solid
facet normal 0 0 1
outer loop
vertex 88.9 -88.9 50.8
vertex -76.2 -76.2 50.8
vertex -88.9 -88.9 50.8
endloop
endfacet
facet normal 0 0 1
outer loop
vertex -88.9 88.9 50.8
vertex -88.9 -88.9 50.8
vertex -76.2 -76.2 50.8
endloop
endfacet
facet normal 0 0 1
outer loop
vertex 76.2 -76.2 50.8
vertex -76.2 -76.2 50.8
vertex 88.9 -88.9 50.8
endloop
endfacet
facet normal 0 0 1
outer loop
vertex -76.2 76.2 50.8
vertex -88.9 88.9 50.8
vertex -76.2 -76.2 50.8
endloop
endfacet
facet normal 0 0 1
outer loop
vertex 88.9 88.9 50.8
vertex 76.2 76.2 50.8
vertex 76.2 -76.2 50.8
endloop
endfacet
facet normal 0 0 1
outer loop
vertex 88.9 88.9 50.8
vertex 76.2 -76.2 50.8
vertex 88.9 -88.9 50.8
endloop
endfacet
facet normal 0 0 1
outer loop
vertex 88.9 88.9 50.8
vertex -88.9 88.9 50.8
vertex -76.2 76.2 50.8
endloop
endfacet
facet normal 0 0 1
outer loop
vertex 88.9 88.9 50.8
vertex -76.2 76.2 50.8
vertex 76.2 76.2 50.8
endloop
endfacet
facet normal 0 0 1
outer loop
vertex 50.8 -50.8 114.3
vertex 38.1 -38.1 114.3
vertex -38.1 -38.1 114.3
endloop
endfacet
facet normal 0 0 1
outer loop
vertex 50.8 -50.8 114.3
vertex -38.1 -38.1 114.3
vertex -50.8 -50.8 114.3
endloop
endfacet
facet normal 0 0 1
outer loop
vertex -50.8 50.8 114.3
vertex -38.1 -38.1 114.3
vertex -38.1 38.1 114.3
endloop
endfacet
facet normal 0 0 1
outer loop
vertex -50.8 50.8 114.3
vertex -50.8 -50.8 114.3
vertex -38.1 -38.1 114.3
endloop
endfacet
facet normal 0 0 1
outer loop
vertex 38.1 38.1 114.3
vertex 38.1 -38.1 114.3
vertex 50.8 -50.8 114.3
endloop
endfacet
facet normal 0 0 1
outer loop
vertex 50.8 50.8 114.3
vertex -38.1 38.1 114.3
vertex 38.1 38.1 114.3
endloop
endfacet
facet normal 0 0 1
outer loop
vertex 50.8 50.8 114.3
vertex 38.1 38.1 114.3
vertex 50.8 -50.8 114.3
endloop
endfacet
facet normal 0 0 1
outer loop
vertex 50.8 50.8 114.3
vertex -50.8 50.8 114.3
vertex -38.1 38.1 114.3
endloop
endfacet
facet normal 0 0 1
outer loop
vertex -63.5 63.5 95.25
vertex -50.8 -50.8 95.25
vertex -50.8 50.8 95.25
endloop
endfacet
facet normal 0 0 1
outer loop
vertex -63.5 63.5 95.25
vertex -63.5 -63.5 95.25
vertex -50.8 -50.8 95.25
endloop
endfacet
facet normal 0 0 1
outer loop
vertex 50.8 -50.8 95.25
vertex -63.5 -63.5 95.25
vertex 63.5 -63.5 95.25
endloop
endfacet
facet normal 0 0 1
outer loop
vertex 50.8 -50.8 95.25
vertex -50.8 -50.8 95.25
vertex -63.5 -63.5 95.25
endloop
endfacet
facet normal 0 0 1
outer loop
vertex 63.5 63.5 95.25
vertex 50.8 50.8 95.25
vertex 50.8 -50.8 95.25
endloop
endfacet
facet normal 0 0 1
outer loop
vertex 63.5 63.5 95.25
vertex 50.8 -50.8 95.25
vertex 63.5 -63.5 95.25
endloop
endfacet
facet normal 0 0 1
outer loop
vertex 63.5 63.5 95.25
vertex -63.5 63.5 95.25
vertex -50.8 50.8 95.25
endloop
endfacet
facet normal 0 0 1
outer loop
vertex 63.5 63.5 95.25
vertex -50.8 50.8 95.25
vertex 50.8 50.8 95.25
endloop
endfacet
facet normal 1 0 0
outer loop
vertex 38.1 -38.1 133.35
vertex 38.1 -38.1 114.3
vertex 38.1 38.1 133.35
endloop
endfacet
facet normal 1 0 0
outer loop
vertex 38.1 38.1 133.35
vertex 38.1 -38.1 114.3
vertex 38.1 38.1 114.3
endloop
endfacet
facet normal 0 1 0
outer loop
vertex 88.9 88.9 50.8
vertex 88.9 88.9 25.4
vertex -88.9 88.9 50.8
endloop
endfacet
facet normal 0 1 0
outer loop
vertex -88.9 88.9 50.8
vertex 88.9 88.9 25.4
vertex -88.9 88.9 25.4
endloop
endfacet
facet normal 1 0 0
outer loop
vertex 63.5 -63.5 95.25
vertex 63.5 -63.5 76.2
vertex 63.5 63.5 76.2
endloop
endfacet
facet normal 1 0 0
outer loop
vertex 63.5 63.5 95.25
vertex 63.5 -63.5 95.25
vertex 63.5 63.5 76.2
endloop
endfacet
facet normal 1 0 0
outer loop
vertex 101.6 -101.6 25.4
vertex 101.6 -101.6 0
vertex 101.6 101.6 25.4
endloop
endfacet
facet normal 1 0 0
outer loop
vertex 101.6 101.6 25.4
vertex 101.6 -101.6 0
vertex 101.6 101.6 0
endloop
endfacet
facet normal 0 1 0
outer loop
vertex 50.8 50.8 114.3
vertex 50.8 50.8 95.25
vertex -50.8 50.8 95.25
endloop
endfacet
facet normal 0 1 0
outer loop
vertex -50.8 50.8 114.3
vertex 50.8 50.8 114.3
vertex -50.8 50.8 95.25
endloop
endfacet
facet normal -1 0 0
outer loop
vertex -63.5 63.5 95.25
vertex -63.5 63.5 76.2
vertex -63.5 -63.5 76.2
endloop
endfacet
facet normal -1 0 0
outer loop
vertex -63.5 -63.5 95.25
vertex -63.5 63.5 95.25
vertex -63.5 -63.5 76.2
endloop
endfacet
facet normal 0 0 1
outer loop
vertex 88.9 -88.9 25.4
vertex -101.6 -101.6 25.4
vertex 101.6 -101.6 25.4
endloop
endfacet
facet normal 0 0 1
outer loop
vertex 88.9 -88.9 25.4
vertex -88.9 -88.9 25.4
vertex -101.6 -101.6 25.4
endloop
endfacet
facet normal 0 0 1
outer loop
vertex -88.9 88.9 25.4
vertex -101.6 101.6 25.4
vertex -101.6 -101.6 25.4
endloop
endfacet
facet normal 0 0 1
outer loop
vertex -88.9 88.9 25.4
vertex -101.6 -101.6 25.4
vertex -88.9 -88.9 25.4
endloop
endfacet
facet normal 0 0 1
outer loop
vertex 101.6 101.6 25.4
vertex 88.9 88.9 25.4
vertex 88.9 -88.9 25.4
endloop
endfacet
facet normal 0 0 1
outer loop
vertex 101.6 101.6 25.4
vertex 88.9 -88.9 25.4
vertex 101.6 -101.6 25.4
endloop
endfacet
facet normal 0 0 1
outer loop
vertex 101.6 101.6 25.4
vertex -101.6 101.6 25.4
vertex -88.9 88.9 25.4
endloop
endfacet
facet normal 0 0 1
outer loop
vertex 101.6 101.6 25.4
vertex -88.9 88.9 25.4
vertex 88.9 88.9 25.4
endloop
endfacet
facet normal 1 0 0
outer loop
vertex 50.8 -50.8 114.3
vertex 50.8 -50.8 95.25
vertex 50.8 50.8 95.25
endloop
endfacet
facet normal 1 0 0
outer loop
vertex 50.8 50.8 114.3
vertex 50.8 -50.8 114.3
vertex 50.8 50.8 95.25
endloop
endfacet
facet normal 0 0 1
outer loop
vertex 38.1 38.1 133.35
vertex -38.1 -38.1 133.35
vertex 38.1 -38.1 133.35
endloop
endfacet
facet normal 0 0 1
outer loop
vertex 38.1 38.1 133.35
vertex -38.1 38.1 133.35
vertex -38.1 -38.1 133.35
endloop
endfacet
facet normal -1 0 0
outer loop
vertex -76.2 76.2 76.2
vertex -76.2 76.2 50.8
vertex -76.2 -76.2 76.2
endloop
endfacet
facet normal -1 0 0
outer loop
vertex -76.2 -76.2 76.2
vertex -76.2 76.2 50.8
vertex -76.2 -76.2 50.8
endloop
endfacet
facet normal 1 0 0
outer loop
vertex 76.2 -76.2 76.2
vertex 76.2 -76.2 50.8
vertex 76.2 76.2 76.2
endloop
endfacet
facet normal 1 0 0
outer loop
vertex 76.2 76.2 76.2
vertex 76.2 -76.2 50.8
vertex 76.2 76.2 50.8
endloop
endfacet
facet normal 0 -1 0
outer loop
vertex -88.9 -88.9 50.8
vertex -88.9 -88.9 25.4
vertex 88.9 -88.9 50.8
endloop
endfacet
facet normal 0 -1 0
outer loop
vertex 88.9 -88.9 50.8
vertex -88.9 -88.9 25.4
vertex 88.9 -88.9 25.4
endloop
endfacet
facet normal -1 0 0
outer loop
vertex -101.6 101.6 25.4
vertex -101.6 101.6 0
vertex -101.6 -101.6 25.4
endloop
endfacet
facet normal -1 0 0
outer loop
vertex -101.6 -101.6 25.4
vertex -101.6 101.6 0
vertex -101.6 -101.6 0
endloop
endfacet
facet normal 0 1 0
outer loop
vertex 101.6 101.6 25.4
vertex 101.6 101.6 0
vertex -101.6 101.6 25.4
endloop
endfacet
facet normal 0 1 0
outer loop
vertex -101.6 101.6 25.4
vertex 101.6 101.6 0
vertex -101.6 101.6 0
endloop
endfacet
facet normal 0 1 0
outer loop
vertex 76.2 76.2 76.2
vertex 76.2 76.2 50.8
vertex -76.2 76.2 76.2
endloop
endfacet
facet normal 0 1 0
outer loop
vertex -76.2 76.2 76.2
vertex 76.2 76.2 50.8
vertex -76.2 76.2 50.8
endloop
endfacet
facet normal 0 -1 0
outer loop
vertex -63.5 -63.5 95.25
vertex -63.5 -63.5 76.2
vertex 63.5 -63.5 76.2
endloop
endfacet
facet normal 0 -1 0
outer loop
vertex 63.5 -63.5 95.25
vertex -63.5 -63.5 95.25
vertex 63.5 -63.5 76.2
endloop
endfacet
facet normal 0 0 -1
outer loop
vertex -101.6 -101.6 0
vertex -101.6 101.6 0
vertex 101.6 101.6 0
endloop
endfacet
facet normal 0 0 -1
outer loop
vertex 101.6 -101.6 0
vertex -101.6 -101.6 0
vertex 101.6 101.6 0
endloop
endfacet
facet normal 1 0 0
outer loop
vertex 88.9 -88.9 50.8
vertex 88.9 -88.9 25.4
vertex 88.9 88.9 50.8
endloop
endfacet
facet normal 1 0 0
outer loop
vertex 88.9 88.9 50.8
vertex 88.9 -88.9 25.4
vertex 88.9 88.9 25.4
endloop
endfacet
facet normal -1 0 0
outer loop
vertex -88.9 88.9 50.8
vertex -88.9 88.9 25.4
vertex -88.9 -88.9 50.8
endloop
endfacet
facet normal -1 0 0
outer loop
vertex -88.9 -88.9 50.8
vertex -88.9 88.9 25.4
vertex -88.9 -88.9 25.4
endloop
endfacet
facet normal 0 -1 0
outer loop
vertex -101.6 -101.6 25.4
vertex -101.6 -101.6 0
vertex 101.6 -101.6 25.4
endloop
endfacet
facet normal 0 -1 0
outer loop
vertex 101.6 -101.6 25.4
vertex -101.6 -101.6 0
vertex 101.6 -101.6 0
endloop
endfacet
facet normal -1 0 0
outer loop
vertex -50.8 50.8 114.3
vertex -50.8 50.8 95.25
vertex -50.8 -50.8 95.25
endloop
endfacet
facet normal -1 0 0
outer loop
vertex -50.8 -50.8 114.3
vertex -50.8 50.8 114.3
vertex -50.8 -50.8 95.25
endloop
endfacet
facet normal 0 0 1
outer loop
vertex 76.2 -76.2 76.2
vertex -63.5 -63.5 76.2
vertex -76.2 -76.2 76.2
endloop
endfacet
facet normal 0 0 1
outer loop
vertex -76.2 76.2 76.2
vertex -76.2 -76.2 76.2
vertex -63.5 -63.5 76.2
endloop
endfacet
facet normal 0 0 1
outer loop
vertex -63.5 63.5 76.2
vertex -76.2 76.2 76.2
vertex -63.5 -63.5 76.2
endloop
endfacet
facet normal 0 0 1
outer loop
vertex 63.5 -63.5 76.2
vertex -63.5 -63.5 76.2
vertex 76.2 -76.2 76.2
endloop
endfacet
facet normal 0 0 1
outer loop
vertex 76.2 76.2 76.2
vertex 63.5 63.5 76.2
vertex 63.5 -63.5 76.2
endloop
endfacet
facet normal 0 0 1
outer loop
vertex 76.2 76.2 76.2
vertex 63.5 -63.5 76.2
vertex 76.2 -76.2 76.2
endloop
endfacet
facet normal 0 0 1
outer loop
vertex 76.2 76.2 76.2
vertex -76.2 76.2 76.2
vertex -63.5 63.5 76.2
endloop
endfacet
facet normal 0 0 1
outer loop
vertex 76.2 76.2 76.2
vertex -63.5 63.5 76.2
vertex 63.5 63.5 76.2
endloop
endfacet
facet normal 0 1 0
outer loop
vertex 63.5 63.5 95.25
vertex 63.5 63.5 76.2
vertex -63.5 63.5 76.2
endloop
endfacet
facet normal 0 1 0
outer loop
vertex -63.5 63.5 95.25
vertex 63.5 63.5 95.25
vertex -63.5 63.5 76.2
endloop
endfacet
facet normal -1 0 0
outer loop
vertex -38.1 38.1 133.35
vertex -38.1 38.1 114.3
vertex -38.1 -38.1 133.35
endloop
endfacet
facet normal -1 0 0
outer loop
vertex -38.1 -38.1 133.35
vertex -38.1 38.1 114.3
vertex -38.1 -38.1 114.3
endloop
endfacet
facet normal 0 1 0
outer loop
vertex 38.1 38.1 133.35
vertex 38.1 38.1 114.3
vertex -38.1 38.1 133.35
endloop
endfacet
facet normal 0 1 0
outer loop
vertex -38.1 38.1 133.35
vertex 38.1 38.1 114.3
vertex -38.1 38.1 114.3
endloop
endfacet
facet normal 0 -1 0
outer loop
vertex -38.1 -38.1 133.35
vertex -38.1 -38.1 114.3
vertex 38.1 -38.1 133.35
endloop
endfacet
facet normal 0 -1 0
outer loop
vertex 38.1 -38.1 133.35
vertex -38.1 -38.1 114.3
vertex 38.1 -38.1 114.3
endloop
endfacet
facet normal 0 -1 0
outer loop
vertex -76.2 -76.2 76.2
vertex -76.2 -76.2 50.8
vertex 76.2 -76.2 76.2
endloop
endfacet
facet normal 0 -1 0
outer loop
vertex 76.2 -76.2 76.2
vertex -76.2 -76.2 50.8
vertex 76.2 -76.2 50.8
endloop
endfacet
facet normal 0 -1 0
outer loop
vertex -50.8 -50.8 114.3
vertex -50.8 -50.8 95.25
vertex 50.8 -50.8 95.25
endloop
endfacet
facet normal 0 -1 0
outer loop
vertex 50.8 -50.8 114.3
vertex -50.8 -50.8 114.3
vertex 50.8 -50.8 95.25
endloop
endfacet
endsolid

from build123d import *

# Parameters (mm, degrees)
F0_W      = 101.6
F0_H      = 101.6
F1_DEPTH  = 25.4
F2_W      = 88.9
F2_H      = 88.9
F3_DEPTH  = 25.4
F4_W      = 76.2
F4_H      = 76.2
F5_DEPTH  = 25.4
F6_W      = 63.5
F6_H      = 63.5
F7_DEPTH  = 19.05
F8_W      = 50.8
F8_H      = 50.8
F9_DEPTH  = 19.05
F10_W     = 38.1
F10_H     = 38.1
F11_DEPTH = 19.05


with BuildPart() as f1:
    # F0 (on Top) → F1 (new body)
    with BuildSketch(Plane.XY):
        with Locations((50.8, 50.8)):
            Rectangle(F0_W, F0_H)
        with Locations((-50.8, 50.8)):
            Rectangle(F0_W, F0_H)
        with Locations((-50.8, -50.8)):
            Rectangle(F0_W, F0_H)
        with Locations((50.8, -50.8)):
            Rectangle(F0_W, F0_H)
    extrude(amount=F1_DEPTH)

    # F2 (on face) → F3 (join)
    with BuildSketch(Plane.XY.offset(25.4)):
        with Locations((44.45, 44.45)):
            Rectangle(F2_W, F2_H)
        with Locations((44.45, -44.45)):
            Rectangle(F2_W, F2_H)
        with Locations((-44.45, -44.45)):
            Rectangle(F2_W, F2_H)
        with Locations((-44.45, 44.45)):
            Rectangle(F2_W, F2_H)
    extrude(amount=F3_DEPTH)

    # F4 (on face) → F5 (join)
    with BuildSketch(Plane.XY.offset(50.8)):
        with Locations((38.1, 38.1)):
            Rectangle(F4_W, F4_H)
        with Locations((38.1, -38.1)):
            Rectangle(F4_W, F4_H)
        with Locations((-38.1, -38.1)):
            Rectangle(F4_W, F4_H)
        with Locations((-38.1, 38.1)):
            Rectangle(F4_W, F4_H)
    extrude(amount=F5_DEPTH)

    # F6 (on face) → F7 (join)
    with BuildSketch(Plane.XY.offset(76.2)):
        with Locations((31.75, -31.75)):
            Rectangle(F6_W, F6_H)
        with Locations((-31.75, -31.75)):
            Rectangle(F6_W, F6_H)
        with Locations((31.75, 31.75)):
            Rectangle(F6_W, F6_H)
        with Locations((-31.75, 31.75)):
            Rectangle(F6_W, F6_H)
    extrude(amount=F7_DEPTH)

    # F8 (on face) → F9 (join)
    with BuildSketch(Plane.XY.offset(95.25)):
        with Locations((25.4, 25.4)):
            Rectangle(F8_W, F8_H)
        with Locations((25.4, -25.4)):
            Rectangle(F8_W, F8_H)
        with Locations((-25.4, -25.4)):
            Rectangle(F8_W, F8_H)
        with Locations((-25.4, 25.4)):
            Rectangle(F8_W, F8_H)
    extrude(amount=F9_DEPTH)

    # F10 (on face) → F11 (join)
    with BuildSketch(Plane.XY.offset(114.3)):
        with Locations((-19.05, -19.05)):
            Rectangle(F10_W, F10_H)
        with Locations((19.05, -19.05)):
            Rectangle(F10_W, F10_H)
        with Locations((19.05, 19.05)):
            Rectangle(F10_W, F10_H)
        with Locations((-19.05, 19.05)):
            Rectangle(F10_W, F10_H)
    extrude(amount=F11_DEPTH)


solid = f1.part
